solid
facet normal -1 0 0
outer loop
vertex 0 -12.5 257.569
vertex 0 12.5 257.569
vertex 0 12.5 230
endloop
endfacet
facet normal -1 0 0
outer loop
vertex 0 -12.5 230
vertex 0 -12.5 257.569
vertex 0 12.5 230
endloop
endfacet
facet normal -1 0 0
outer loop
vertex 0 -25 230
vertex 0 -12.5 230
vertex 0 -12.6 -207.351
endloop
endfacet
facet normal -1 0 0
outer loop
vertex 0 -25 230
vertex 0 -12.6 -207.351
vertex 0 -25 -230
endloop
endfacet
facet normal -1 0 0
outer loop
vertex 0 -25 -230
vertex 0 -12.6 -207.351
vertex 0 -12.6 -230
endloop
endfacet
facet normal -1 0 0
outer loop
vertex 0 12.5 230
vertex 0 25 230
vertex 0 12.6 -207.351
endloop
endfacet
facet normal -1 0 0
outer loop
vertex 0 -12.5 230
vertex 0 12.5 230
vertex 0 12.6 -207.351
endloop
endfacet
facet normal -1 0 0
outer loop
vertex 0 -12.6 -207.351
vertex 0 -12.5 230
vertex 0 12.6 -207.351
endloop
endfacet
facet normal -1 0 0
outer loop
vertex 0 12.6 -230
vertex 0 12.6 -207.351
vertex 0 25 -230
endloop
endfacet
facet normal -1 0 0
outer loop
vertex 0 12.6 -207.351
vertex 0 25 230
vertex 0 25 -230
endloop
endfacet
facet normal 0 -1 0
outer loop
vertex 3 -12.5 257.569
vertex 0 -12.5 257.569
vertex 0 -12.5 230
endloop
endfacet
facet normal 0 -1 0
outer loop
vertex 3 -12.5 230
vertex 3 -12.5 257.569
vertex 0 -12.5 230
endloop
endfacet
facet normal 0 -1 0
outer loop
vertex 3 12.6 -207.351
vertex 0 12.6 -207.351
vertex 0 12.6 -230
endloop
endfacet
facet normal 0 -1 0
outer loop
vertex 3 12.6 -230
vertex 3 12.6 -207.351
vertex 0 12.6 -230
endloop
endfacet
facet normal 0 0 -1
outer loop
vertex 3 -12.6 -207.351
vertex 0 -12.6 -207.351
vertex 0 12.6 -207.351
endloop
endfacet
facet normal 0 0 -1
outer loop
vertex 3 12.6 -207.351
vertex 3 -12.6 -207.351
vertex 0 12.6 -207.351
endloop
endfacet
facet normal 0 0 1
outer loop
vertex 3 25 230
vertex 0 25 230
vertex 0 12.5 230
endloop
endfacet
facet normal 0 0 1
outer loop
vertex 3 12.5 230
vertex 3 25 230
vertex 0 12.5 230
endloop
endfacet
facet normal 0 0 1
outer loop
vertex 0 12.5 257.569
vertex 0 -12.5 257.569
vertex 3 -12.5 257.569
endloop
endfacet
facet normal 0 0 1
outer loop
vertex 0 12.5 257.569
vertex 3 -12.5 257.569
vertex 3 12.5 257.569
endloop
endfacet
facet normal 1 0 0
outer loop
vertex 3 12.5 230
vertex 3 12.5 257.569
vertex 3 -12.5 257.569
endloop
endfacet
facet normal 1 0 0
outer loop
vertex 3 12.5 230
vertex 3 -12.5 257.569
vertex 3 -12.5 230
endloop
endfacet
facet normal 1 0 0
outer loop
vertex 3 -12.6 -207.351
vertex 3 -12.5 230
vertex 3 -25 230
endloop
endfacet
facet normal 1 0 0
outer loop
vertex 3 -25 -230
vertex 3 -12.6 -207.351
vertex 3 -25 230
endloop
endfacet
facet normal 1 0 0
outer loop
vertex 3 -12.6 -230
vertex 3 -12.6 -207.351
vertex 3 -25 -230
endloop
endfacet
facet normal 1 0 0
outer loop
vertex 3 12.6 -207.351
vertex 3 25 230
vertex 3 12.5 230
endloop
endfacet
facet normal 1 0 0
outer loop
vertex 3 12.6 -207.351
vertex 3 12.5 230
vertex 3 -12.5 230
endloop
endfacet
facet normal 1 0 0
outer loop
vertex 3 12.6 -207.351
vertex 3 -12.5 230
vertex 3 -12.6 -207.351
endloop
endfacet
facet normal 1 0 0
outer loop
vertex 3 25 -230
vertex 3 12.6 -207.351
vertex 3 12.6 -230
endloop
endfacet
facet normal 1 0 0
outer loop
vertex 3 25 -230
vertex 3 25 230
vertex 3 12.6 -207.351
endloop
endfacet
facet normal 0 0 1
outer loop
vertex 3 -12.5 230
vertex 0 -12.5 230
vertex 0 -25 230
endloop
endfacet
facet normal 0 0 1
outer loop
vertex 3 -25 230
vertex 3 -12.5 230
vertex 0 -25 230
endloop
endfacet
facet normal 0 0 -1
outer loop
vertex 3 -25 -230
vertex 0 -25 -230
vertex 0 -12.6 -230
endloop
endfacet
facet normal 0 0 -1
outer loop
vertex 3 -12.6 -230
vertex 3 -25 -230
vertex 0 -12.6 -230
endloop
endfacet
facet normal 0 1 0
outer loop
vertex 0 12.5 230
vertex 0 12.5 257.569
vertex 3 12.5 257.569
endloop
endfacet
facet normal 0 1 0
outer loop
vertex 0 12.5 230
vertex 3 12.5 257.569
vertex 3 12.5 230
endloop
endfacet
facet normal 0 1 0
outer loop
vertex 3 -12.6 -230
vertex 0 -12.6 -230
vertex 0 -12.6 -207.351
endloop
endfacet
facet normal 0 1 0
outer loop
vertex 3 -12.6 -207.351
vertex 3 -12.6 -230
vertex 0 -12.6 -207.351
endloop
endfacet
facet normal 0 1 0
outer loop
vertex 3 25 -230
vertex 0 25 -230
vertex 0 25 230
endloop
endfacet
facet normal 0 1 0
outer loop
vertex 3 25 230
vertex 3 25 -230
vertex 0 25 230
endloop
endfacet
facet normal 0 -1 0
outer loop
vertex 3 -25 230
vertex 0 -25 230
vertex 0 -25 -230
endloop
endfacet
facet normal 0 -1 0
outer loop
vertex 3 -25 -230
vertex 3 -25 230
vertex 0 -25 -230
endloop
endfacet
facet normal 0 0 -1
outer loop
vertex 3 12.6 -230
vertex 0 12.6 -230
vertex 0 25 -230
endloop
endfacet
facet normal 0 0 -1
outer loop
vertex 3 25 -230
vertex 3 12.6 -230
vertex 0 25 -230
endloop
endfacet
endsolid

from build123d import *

# Parameters (mm, degrees)
ESQUISSE2_W        = 27.56942971
ESQUISSE2_H        = 25
BOSS_EXTRU_3_DEPTH = 3


with BuildPart() as part:
    # Esquisse2 → Boss.-Extru.3 (new body)
    with BuildSketch(Plane(origin=(0, 0, 0), x_dir=(0, 0, -1), z_dir=(1, 0, 0))):
        with Locations((-243.784714855, 0)):
            Rectangle(ESQUISSE2_W, ESQUISSE2_H)
        Polygon((230, 25), (-230, 25), (-230, 12.5), (-230, -12.5), (-230, -25), (230, -25), (230, -12.6), (207.351490585, -12.6), (207.351490585, 12.6), (230, 12.6), align=None)
    extrude(amount=BOSS_EXTRU_3_DEPTH)


solid = part.part
